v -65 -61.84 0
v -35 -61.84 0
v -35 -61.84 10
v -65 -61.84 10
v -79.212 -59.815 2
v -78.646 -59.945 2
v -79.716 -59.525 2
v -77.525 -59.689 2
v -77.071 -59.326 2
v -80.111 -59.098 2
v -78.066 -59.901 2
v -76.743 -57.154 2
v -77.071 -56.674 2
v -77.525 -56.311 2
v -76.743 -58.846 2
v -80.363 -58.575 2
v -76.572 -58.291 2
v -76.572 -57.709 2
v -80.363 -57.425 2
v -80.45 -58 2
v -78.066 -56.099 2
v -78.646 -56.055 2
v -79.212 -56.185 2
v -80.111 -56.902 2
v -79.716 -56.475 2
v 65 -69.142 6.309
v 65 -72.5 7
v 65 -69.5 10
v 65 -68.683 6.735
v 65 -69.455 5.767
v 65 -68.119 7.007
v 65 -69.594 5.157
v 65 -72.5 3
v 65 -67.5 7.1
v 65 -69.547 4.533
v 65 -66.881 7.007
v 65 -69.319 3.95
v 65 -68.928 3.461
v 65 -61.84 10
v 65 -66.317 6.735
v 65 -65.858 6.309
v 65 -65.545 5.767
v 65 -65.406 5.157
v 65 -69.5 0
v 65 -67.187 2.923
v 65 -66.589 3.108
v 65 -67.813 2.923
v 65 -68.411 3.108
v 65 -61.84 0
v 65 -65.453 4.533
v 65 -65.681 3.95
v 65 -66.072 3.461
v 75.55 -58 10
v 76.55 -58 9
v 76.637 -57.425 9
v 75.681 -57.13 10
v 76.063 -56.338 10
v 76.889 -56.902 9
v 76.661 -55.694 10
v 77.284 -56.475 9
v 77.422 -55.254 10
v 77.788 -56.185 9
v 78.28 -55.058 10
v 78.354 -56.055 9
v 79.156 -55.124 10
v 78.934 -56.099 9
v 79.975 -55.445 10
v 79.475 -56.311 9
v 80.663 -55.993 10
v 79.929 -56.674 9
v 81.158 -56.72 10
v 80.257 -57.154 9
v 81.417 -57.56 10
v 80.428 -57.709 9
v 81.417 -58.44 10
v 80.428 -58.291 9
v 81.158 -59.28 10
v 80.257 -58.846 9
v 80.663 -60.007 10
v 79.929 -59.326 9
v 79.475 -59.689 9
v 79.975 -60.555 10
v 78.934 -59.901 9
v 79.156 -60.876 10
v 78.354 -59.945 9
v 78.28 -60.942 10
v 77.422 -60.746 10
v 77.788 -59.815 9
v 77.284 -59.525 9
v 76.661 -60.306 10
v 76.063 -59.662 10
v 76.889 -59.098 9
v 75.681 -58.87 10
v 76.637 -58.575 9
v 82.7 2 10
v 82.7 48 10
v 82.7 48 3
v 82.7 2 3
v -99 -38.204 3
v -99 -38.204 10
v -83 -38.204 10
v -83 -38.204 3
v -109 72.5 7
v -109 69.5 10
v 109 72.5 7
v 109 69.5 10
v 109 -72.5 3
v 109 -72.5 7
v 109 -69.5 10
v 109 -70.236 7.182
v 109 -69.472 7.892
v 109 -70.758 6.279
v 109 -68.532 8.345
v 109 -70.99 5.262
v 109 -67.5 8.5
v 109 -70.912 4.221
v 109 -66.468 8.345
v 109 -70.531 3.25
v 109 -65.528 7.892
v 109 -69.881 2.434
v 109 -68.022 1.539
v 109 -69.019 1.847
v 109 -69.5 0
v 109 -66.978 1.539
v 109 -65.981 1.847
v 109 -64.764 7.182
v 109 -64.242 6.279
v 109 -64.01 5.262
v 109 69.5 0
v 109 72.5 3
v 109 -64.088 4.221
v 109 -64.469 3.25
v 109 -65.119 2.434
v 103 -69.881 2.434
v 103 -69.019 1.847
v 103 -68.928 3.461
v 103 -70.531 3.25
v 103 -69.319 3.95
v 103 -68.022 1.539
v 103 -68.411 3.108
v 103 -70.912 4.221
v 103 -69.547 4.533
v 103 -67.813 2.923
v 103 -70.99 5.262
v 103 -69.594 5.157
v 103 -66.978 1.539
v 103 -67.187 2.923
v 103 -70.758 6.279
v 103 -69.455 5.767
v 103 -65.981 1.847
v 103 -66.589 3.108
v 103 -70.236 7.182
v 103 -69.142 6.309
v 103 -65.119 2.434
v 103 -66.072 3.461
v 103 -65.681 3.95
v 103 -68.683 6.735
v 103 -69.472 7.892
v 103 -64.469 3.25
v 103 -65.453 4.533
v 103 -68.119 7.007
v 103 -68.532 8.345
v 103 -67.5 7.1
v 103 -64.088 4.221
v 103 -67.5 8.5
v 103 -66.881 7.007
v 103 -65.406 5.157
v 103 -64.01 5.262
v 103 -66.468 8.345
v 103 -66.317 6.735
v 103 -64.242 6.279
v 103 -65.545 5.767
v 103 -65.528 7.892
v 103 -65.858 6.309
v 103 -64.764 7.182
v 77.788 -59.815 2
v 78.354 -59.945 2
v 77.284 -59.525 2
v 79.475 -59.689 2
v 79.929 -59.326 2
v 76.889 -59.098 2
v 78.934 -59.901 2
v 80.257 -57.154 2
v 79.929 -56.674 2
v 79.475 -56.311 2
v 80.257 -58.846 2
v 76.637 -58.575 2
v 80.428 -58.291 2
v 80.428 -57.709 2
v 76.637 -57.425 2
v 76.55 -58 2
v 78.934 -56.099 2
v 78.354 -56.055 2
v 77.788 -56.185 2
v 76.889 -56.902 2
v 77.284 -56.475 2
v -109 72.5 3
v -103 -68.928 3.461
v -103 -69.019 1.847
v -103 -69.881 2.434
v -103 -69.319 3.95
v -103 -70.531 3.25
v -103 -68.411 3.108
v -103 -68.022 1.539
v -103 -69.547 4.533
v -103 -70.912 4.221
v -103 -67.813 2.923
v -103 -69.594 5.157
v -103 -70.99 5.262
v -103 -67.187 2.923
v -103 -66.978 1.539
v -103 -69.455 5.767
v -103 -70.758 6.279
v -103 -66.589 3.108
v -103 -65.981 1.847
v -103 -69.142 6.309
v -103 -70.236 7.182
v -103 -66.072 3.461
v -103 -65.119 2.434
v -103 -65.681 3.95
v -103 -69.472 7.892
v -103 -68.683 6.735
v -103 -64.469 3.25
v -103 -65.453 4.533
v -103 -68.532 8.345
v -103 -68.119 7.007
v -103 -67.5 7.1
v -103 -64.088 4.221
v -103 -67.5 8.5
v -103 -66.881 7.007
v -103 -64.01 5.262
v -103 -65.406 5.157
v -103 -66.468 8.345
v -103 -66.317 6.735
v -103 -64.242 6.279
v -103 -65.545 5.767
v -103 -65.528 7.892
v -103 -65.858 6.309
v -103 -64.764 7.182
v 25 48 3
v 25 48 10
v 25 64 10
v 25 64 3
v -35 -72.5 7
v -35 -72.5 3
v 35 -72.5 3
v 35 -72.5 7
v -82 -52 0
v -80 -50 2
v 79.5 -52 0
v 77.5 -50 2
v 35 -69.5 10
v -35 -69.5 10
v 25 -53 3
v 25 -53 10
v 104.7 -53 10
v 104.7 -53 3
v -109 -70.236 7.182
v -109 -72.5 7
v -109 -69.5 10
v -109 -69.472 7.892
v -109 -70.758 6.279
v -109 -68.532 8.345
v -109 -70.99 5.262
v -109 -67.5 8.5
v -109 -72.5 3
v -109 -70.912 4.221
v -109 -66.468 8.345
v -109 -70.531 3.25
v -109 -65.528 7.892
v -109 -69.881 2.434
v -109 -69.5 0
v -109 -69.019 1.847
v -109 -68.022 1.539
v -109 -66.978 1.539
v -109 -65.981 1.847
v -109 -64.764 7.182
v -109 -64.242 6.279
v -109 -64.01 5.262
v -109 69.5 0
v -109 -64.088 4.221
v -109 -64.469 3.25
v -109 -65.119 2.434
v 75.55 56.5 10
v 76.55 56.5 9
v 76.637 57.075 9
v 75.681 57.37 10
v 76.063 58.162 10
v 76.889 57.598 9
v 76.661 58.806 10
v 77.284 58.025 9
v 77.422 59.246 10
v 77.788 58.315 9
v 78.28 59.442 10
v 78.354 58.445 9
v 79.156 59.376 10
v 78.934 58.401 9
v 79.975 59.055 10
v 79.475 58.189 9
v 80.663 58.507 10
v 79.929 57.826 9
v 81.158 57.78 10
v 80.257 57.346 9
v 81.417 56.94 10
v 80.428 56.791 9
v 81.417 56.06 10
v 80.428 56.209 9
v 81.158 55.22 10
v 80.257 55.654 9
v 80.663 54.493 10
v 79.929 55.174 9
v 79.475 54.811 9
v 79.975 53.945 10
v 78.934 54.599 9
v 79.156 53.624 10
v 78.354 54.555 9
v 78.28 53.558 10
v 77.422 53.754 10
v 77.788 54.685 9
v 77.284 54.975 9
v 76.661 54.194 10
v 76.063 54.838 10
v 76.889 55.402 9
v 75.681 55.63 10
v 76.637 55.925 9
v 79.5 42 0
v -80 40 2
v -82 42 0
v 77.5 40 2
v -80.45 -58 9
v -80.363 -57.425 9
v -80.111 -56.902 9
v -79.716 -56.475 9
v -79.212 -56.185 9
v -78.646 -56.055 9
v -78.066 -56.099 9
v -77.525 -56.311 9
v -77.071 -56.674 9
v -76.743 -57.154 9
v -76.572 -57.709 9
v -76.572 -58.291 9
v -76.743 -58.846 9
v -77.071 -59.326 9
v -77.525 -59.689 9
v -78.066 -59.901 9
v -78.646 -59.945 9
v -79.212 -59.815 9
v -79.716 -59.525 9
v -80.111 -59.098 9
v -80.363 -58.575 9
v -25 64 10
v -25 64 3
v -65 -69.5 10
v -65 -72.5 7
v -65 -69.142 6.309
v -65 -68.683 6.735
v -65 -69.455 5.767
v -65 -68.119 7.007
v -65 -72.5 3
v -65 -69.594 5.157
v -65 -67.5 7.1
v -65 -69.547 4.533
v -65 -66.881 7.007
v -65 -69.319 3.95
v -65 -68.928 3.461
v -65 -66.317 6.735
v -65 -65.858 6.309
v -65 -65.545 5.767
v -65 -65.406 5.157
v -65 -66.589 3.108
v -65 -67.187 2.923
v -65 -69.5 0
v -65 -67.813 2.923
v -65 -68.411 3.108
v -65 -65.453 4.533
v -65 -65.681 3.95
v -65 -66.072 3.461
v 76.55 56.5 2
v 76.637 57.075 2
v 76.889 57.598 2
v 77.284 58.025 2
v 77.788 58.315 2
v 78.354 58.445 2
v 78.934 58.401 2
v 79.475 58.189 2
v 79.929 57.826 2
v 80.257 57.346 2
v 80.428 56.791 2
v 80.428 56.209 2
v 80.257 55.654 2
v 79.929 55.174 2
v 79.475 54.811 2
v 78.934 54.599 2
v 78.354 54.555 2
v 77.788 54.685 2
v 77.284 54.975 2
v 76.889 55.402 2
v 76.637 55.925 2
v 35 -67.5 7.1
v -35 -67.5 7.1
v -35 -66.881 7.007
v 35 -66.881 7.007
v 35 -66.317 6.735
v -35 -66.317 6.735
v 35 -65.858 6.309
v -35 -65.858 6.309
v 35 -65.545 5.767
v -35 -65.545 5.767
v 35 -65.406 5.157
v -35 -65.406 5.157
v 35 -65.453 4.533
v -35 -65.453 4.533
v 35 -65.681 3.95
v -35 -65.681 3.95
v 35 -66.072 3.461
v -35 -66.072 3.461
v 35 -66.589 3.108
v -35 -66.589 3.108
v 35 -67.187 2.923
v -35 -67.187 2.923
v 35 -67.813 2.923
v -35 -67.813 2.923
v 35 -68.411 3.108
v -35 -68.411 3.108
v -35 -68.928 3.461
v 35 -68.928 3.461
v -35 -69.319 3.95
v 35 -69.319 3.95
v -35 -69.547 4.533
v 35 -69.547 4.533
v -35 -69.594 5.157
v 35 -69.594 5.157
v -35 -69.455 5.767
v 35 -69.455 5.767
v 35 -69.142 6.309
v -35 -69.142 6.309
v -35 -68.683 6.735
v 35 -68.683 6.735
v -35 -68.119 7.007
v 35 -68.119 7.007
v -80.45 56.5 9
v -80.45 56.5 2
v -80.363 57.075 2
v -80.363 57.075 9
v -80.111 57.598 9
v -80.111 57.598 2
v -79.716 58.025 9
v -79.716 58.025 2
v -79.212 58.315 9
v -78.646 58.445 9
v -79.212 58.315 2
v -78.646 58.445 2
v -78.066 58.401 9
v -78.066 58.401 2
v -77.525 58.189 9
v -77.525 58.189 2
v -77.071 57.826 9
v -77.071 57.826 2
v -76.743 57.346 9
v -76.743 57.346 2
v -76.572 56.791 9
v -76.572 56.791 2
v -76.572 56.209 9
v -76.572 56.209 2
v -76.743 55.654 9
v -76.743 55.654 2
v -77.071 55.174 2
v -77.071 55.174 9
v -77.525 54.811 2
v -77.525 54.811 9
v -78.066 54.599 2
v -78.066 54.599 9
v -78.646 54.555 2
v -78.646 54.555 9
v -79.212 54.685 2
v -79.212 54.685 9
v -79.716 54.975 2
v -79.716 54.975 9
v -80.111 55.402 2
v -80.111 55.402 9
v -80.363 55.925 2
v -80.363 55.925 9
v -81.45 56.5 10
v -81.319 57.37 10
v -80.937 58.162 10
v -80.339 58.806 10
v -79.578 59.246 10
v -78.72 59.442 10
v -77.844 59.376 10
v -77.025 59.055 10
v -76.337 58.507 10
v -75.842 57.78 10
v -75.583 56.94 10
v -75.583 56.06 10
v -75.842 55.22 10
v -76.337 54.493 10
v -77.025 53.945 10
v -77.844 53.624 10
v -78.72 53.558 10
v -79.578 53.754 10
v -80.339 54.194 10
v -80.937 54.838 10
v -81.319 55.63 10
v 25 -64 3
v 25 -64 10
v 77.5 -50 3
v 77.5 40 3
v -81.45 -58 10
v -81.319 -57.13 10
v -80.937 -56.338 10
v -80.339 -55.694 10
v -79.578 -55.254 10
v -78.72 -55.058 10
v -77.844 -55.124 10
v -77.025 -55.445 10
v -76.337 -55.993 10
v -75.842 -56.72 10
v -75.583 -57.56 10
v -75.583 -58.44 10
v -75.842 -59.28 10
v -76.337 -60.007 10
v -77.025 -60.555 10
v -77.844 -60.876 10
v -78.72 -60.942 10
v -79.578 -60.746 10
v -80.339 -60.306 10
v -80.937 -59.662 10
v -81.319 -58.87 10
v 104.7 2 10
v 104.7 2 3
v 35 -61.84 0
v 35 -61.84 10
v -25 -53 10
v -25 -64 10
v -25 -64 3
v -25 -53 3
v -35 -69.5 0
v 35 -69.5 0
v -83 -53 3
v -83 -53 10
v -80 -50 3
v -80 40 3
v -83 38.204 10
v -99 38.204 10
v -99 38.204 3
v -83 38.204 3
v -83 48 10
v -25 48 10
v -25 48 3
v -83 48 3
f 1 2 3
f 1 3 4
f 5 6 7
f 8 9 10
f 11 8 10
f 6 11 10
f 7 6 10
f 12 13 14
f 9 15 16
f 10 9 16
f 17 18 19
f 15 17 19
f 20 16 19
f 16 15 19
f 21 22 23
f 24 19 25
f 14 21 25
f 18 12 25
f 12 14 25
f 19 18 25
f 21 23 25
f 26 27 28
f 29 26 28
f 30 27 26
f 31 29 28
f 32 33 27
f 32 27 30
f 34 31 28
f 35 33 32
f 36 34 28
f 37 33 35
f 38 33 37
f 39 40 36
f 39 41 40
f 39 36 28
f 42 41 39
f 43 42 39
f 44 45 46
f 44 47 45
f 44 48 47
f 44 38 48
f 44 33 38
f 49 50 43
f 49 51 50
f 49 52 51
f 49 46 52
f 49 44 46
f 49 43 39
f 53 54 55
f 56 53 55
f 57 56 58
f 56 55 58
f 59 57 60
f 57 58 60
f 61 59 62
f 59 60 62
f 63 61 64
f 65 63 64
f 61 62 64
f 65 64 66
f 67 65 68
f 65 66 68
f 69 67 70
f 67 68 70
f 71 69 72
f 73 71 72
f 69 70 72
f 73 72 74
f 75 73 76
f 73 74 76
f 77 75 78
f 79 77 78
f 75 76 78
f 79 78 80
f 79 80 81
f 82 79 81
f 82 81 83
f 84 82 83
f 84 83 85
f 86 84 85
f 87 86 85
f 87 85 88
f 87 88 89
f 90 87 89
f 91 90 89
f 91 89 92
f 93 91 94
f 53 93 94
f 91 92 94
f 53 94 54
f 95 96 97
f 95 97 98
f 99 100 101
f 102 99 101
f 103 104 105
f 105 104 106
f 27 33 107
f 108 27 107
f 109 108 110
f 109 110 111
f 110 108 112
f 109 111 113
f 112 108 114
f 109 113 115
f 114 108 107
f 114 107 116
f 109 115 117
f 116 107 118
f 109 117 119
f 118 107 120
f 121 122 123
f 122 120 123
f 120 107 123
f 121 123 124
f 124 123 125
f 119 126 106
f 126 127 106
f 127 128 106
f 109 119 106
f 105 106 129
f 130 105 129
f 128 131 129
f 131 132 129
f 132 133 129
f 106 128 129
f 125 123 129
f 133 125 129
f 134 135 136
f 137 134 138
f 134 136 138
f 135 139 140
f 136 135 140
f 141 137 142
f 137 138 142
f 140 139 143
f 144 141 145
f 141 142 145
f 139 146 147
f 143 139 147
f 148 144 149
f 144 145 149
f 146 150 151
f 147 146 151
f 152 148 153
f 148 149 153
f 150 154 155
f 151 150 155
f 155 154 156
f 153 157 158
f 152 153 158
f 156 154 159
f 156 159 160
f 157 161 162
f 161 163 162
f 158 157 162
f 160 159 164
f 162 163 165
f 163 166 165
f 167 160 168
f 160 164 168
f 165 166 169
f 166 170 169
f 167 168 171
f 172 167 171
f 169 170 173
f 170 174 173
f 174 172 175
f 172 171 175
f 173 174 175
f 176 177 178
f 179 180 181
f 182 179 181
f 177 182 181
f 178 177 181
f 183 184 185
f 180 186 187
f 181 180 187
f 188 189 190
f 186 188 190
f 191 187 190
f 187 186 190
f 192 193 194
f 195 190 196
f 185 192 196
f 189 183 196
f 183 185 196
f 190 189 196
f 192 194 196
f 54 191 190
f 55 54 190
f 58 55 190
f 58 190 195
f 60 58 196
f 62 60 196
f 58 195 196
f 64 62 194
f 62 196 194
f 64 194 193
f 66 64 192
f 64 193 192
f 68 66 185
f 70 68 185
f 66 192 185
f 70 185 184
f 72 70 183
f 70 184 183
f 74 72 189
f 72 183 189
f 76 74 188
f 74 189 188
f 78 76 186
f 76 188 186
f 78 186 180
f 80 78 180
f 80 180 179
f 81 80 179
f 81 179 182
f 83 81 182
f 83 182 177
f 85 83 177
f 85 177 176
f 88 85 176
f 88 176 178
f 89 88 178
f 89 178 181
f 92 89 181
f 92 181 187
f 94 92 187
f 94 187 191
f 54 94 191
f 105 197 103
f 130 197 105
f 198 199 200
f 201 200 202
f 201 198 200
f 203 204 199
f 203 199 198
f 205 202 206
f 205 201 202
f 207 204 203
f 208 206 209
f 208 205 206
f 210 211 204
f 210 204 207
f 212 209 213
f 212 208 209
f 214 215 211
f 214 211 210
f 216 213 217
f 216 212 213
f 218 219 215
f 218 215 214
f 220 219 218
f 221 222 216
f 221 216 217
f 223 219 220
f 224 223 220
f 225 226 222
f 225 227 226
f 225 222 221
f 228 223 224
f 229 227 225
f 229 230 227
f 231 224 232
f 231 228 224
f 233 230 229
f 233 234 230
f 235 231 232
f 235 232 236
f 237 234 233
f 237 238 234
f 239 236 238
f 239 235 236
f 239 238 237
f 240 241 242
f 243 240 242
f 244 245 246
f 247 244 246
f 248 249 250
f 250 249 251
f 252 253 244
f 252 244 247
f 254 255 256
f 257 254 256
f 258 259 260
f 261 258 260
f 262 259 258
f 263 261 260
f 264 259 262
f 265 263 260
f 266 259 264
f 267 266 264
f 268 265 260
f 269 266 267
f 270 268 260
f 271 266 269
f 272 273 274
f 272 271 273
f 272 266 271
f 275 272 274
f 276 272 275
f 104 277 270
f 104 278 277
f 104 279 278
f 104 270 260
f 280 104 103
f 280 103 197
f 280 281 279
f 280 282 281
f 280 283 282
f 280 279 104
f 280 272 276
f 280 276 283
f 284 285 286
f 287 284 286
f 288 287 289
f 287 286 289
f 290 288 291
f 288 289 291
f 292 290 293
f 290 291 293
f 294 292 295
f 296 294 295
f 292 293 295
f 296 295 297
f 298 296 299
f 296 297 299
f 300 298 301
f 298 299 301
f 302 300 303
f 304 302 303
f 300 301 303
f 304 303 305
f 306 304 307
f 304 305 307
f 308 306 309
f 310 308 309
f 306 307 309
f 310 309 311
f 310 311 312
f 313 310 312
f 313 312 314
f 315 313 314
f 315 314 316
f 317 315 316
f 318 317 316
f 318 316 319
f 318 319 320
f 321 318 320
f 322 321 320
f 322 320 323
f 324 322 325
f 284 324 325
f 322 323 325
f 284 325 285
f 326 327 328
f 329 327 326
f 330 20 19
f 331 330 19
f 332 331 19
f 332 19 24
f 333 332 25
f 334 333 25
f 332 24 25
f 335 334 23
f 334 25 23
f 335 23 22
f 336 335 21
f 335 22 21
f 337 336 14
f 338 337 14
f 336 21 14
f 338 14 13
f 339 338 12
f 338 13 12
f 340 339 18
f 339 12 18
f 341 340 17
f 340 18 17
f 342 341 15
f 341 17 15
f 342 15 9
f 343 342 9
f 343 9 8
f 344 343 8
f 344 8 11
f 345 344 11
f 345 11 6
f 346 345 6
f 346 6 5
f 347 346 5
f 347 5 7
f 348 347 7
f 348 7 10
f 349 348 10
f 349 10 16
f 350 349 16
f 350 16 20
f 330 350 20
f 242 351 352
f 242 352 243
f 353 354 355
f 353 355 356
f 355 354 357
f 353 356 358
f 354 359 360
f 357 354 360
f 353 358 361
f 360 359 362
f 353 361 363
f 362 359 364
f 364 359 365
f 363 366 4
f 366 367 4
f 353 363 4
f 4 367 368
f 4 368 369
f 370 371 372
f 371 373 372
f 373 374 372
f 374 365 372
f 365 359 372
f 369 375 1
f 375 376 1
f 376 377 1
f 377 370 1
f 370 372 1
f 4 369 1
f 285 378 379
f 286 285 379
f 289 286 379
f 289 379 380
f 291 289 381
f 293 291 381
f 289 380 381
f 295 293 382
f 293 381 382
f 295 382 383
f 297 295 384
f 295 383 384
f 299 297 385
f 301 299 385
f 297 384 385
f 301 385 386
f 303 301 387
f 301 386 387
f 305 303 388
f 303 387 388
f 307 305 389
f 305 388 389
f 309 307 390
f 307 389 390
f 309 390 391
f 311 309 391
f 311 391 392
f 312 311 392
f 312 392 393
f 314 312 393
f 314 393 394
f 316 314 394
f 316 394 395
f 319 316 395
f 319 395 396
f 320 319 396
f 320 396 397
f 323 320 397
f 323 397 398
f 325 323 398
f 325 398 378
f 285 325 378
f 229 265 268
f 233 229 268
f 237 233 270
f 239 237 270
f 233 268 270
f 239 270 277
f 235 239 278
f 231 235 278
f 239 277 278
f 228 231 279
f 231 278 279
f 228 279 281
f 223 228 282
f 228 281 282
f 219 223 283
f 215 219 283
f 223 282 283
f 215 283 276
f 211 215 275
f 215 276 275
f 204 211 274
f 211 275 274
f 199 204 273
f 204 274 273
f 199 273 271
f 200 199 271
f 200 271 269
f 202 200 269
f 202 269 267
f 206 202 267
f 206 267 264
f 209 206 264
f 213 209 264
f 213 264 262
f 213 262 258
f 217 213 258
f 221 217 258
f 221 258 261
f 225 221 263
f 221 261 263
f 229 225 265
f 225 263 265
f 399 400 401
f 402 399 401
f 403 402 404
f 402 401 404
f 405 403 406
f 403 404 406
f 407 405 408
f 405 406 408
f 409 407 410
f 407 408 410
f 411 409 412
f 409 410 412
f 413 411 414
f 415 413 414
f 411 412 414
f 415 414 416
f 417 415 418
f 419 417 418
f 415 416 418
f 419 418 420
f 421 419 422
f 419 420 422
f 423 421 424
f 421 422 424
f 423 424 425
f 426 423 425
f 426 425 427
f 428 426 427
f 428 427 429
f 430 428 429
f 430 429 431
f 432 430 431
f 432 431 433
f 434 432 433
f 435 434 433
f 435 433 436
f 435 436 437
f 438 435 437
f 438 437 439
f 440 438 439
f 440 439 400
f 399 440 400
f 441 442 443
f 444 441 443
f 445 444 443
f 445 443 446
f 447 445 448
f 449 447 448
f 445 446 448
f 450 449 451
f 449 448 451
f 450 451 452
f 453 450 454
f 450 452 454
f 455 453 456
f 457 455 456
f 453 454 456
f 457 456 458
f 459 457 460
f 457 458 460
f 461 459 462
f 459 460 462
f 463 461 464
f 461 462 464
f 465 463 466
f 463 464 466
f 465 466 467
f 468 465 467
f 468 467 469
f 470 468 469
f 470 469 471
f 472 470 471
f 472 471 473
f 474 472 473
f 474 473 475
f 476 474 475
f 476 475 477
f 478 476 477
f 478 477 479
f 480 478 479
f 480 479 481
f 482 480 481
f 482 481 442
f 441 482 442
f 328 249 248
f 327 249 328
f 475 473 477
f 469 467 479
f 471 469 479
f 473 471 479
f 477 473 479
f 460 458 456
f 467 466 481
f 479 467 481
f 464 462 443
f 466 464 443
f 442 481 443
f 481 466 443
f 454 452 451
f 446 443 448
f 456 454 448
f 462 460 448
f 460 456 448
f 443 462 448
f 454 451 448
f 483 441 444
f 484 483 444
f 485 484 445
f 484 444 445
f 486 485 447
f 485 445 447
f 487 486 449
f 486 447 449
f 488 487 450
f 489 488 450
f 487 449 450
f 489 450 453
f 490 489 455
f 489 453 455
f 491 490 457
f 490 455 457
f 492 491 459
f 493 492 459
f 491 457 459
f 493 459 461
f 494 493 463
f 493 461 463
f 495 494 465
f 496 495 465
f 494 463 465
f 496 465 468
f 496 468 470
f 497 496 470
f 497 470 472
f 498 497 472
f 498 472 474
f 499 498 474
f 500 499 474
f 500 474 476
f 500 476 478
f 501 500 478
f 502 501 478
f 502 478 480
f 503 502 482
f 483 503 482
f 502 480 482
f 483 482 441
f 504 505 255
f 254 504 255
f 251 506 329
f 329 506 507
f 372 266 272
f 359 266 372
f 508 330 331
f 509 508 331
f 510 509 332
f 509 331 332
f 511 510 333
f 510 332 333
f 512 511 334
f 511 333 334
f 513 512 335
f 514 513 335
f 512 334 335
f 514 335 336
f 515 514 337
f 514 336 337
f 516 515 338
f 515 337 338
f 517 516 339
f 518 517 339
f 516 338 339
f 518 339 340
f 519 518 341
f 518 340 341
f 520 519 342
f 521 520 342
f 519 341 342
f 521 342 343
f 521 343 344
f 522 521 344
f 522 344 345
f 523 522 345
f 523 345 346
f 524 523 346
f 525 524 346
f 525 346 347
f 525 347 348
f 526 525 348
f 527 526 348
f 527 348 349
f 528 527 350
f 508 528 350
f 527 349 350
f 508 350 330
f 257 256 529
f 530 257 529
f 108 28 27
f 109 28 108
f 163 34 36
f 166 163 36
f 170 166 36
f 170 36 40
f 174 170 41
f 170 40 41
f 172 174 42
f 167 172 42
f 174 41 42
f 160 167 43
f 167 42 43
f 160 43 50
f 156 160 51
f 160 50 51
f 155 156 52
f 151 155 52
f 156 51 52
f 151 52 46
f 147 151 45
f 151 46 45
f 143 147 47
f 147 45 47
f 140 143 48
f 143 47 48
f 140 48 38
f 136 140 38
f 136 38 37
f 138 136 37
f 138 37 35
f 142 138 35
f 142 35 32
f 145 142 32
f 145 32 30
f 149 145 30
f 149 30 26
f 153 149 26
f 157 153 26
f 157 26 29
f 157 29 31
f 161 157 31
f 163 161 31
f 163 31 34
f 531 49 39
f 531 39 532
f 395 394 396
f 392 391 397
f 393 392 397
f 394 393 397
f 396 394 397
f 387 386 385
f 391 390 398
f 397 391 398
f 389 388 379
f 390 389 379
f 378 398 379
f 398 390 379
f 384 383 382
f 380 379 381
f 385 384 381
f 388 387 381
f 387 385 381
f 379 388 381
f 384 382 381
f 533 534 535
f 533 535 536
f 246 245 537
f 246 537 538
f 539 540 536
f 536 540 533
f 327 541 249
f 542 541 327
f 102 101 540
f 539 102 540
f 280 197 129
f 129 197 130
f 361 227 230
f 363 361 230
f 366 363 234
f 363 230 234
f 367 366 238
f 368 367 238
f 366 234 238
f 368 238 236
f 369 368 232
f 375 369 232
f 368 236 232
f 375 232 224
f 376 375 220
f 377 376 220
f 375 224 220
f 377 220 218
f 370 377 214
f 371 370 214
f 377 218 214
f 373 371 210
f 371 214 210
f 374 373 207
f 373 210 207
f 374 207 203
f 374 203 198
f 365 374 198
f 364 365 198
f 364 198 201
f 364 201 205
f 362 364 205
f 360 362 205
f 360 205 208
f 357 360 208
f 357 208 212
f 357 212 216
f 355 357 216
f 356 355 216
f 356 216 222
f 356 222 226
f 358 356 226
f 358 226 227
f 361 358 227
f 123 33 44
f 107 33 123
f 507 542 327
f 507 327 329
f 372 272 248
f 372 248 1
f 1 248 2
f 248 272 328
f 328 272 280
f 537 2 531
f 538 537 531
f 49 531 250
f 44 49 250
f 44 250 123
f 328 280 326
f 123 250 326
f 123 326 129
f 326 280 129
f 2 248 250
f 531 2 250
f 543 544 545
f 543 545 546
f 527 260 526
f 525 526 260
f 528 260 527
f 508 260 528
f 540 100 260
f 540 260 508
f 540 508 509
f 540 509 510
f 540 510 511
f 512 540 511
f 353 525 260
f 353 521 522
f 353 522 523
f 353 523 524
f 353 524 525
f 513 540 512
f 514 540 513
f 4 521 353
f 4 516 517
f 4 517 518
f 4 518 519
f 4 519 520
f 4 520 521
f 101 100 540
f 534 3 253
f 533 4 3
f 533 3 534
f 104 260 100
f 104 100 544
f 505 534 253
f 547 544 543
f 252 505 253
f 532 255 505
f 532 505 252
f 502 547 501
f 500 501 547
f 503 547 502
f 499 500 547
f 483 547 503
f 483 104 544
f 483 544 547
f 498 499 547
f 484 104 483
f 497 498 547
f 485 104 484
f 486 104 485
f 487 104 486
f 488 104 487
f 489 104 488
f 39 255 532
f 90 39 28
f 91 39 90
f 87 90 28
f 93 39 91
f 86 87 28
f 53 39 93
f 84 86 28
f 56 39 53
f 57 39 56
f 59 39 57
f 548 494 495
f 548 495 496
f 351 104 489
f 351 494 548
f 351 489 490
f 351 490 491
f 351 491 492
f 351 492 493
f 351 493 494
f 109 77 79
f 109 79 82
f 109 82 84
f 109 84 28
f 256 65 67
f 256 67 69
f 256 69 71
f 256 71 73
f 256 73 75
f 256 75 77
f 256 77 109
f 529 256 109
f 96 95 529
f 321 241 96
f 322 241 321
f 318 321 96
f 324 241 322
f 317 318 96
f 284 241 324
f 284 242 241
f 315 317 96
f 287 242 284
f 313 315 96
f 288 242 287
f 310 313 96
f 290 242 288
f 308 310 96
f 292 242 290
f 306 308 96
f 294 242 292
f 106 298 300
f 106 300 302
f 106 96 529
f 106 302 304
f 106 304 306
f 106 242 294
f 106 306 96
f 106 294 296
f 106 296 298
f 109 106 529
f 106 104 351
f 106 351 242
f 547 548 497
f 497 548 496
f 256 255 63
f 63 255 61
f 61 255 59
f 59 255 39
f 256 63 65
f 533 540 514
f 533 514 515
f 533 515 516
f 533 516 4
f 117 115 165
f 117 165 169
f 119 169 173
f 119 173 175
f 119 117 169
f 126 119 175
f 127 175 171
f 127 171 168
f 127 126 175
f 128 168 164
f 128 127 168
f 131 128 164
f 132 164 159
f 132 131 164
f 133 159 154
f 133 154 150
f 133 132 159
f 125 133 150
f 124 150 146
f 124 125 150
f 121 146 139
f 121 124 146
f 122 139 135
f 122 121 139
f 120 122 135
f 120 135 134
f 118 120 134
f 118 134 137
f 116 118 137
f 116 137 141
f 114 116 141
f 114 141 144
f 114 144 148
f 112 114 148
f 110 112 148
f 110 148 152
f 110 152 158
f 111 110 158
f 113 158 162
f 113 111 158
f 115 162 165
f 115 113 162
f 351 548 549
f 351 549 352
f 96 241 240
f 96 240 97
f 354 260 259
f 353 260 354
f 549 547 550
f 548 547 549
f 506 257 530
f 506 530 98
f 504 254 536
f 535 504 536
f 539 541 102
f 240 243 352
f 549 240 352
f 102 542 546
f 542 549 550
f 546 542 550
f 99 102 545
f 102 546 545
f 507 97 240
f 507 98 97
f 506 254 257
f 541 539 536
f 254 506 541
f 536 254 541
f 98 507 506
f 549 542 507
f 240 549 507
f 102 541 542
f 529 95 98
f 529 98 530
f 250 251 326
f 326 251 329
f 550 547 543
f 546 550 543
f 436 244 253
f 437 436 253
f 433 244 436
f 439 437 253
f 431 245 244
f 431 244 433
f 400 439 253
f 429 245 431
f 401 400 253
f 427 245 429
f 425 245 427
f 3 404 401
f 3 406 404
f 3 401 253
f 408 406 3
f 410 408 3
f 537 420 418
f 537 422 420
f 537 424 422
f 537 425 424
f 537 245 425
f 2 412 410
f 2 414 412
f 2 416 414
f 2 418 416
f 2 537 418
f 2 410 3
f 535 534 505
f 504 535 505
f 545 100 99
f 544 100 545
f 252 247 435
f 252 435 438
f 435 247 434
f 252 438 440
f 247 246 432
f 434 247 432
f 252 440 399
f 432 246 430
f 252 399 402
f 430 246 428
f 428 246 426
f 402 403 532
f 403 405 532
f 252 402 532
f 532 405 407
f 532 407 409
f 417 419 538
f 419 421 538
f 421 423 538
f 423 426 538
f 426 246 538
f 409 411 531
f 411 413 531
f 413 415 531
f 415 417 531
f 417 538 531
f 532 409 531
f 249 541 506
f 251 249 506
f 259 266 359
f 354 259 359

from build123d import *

# Parameters (mm, degrees)
CROQUIS1_W              = 218
CROQUIS1_H              = 145
SALIENTE_EXTRUIR1_DEPTH = 10
CORTAR_EXTRUIR1_DEPTH   = 7
CROQUIS3_W              = 157.5
CROQUIS3_H              = 90
CORTAR_EXTRUIR2_DEPTH   = 4
CHAFL_N1_SIZE           = 2
CORTAR_EXTRUIR3_START   = -2
CROQUIS4_R              = 1.95
CORTAR_EXTRUIR3_DEPTH   = 9
CROQUIS5_W              = 22
CROQUIS5_H              = 55
CROQUIS5_W_2            = 16
CROQUIS5_H_2            = 76.408682756
CROQUIS5_W_3            = 50
CROQUIS5_H_3            = 16
CORTAR_EXTRUIR4_DEPTH   = 7
CROQUIS8_R              = 2.1
CORTAR_EXTRUIR6_DEPTH   = 219
CROQUIS9_R              = 3.5
CORTAR_EXTRUIR7_DEPTH   = 6
CHAFL_N2_SIZE           = 3
CROQUIS10_W             = 30
CROQUIS10_H             = 10.660254038
CORTAR_EXTRUIR8_DEPTH   = 11
CHAFL_N3_SIZE           = 1


with BuildPart() as part:
    # Croquis1 → Saliente-Extruir1 (new body)
    with BuildSketch(Plane.XY):
        Rectangle(CROQUIS1_W, CROQUIS1_H)
    extrude(amount=SALIENTE_EXTRUIR1_DEPTH)

    # Croquis2 → Cortar-Extruir1 (cut)
    with BuildSketch(Plane.XY.offset(10)):
        Polygon((-83, 43), (-83, 48), (82.7, 48), (82.7, -53), (80.5, -53), (-83, -53), align=None)
    extrude(amount=-CORTAR_EXTRUIR1_DEPTH, mode=Mode.SUBTRACT)

    # Croquis3 → Cortar-Extruir2 (cut, through all)
    with BuildSketch(Plane.XY.offset(3)):
        with Locations((-1.25, -5)):
            Rectangle(CROQUIS3_W, CROQUIS3_H)
    extrude(amount=-CORTAR_EXTRUIR2_DEPTH, mode=Mode.SUBTRACT)

    # Chaflán1
    chafl_n1_edges = [part.edges().sort_by_distance(p)[0] for p in [
        (-80, -5, 0),
        (-1.25, 40, 0),
        (77.5, -5, 0),
        (-1.25, -50, 0),
    ]]
    chamfer(chafl_n1_edges, length=CHAFL_N1_SIZE)

    # Croquis4 → Cortar-Extruir3 (cut, through all)
    with BuildSketch(Plane(origin=(0, 0, 0), x_dir=(-1, 0, 0), z_dir=(0, 0, -1)).offset(CORTAR_EXTRUIR3_START)):
        with Locations((-78.5, 56.5)):
            Circle(CROQUIS4_R)
        with Locations((78.5, 56.5)):
            Circle(CROQUIS4_R)
        with Locations((78.5, -58)):
            Circle(CROQUIS4_R)
        with Locations((-78.5, -58)):
            Circle(CROQUIS4_R)
    extrude(amount=-CORTAR_EXTRUIR3_DEPTH, mode=Mode.SUBTRACT)

    # Croquis5 → Cortar-Extruir4 (cut)
    with BuildSketch(Plane.XY.offset(10)):
        with Locations((93.7, -25.5)):
            Rectangle(CROQUIS5_W, CROQUIS5_H)
        with Locations((-91, 0)):
            Rectangle(CROQUIS5_W_2, CROQUIS5_H_2)
        with Locations((0, 56)):
            Rectangle(CROQUIS5_W_3, CROQUIS5_H_3)
        with Locations((0, -56)):
            Rectangle(CROQUIS5_W_3, CROQUIS5_H_3)
    extrude(amount=-CORTAR_EXTRUIR4_DEPTH, mode=Mode.SUBTRACT)

    # Croquis8 → Cortar-Extruir6 (cut, through all)
    with BuildSketch(Plane.ZY.offset(109)):
        with Locations((5, -67.5)):
            Circle(CROQUIS8_R)
    extrude(amount=-CORTAR_EXTRUIR6_DEPTH, mode=Mode.SUBTRACT)

    # Croquis9 → Cortar-Extruir7 (cut)
    with BuildSketch(Plane.ZY.offset(109)):
        with Locations((5, -67.5)):
            Circle(CROQUIS9_R)
    cortar_extruir7 = extrude(amount=-CORTAR_EXTRUIR7_DEPTH, mode=Mode.SUBTRACT)

    # Simetría1: Cortar-Extruir7 across plane
    add(cortar_extruir7.mirror(Plane(origin=(0, 0, 0), x_dir=(0, 0, 1), z_dir=(1, 0, 0))), mode=Mode.SUBTRACT)

    # Chaflán2
    chafl_n2_edges = [part.edges().sort_by_distance(p)[0] for p in [
        (0, 72.5, 10),
        (0, 72.5, 0),
        (0, -72.5, 0),
        (0, -72.5, 10),
    ]]
    chamfer(chafl_n2_edges, length=CHAFL_N2_SIZE)

    # Croquis10 → Cortar-Extruir8 (cut, through all)
    with BuildSketch(Plane(origin=(0, 0, 0), x_dir=(-1, 0, 0), z_dir=(0, 0, -1))):
        with Locations((-50, -67.169872981)):
            Rectangle(CROQUIS10_W, CROQUIS10_H)
        with Locations((50, -67.169872981)):
            Rectangle(CROQUIS10_W, CROQUIS10_H)
    extrude(amount=-CORTAR_EXTRUIR8_DEPTH, mode=Mode.SUBTRACT)

    # Chaflán3
    chafl_n3_edges = [part.edges().sort_by_distance(p)[0] for p in [
        (80.45, -58, 10),
        (-76.55, -58, 10),
        (-76.55, 56.5, 10),
        (80.45, 56.5, 10),
    ]]
    chamfer(chafl_n3_edges, length=CHAFL_N3_SIZE)


solid = part.part
